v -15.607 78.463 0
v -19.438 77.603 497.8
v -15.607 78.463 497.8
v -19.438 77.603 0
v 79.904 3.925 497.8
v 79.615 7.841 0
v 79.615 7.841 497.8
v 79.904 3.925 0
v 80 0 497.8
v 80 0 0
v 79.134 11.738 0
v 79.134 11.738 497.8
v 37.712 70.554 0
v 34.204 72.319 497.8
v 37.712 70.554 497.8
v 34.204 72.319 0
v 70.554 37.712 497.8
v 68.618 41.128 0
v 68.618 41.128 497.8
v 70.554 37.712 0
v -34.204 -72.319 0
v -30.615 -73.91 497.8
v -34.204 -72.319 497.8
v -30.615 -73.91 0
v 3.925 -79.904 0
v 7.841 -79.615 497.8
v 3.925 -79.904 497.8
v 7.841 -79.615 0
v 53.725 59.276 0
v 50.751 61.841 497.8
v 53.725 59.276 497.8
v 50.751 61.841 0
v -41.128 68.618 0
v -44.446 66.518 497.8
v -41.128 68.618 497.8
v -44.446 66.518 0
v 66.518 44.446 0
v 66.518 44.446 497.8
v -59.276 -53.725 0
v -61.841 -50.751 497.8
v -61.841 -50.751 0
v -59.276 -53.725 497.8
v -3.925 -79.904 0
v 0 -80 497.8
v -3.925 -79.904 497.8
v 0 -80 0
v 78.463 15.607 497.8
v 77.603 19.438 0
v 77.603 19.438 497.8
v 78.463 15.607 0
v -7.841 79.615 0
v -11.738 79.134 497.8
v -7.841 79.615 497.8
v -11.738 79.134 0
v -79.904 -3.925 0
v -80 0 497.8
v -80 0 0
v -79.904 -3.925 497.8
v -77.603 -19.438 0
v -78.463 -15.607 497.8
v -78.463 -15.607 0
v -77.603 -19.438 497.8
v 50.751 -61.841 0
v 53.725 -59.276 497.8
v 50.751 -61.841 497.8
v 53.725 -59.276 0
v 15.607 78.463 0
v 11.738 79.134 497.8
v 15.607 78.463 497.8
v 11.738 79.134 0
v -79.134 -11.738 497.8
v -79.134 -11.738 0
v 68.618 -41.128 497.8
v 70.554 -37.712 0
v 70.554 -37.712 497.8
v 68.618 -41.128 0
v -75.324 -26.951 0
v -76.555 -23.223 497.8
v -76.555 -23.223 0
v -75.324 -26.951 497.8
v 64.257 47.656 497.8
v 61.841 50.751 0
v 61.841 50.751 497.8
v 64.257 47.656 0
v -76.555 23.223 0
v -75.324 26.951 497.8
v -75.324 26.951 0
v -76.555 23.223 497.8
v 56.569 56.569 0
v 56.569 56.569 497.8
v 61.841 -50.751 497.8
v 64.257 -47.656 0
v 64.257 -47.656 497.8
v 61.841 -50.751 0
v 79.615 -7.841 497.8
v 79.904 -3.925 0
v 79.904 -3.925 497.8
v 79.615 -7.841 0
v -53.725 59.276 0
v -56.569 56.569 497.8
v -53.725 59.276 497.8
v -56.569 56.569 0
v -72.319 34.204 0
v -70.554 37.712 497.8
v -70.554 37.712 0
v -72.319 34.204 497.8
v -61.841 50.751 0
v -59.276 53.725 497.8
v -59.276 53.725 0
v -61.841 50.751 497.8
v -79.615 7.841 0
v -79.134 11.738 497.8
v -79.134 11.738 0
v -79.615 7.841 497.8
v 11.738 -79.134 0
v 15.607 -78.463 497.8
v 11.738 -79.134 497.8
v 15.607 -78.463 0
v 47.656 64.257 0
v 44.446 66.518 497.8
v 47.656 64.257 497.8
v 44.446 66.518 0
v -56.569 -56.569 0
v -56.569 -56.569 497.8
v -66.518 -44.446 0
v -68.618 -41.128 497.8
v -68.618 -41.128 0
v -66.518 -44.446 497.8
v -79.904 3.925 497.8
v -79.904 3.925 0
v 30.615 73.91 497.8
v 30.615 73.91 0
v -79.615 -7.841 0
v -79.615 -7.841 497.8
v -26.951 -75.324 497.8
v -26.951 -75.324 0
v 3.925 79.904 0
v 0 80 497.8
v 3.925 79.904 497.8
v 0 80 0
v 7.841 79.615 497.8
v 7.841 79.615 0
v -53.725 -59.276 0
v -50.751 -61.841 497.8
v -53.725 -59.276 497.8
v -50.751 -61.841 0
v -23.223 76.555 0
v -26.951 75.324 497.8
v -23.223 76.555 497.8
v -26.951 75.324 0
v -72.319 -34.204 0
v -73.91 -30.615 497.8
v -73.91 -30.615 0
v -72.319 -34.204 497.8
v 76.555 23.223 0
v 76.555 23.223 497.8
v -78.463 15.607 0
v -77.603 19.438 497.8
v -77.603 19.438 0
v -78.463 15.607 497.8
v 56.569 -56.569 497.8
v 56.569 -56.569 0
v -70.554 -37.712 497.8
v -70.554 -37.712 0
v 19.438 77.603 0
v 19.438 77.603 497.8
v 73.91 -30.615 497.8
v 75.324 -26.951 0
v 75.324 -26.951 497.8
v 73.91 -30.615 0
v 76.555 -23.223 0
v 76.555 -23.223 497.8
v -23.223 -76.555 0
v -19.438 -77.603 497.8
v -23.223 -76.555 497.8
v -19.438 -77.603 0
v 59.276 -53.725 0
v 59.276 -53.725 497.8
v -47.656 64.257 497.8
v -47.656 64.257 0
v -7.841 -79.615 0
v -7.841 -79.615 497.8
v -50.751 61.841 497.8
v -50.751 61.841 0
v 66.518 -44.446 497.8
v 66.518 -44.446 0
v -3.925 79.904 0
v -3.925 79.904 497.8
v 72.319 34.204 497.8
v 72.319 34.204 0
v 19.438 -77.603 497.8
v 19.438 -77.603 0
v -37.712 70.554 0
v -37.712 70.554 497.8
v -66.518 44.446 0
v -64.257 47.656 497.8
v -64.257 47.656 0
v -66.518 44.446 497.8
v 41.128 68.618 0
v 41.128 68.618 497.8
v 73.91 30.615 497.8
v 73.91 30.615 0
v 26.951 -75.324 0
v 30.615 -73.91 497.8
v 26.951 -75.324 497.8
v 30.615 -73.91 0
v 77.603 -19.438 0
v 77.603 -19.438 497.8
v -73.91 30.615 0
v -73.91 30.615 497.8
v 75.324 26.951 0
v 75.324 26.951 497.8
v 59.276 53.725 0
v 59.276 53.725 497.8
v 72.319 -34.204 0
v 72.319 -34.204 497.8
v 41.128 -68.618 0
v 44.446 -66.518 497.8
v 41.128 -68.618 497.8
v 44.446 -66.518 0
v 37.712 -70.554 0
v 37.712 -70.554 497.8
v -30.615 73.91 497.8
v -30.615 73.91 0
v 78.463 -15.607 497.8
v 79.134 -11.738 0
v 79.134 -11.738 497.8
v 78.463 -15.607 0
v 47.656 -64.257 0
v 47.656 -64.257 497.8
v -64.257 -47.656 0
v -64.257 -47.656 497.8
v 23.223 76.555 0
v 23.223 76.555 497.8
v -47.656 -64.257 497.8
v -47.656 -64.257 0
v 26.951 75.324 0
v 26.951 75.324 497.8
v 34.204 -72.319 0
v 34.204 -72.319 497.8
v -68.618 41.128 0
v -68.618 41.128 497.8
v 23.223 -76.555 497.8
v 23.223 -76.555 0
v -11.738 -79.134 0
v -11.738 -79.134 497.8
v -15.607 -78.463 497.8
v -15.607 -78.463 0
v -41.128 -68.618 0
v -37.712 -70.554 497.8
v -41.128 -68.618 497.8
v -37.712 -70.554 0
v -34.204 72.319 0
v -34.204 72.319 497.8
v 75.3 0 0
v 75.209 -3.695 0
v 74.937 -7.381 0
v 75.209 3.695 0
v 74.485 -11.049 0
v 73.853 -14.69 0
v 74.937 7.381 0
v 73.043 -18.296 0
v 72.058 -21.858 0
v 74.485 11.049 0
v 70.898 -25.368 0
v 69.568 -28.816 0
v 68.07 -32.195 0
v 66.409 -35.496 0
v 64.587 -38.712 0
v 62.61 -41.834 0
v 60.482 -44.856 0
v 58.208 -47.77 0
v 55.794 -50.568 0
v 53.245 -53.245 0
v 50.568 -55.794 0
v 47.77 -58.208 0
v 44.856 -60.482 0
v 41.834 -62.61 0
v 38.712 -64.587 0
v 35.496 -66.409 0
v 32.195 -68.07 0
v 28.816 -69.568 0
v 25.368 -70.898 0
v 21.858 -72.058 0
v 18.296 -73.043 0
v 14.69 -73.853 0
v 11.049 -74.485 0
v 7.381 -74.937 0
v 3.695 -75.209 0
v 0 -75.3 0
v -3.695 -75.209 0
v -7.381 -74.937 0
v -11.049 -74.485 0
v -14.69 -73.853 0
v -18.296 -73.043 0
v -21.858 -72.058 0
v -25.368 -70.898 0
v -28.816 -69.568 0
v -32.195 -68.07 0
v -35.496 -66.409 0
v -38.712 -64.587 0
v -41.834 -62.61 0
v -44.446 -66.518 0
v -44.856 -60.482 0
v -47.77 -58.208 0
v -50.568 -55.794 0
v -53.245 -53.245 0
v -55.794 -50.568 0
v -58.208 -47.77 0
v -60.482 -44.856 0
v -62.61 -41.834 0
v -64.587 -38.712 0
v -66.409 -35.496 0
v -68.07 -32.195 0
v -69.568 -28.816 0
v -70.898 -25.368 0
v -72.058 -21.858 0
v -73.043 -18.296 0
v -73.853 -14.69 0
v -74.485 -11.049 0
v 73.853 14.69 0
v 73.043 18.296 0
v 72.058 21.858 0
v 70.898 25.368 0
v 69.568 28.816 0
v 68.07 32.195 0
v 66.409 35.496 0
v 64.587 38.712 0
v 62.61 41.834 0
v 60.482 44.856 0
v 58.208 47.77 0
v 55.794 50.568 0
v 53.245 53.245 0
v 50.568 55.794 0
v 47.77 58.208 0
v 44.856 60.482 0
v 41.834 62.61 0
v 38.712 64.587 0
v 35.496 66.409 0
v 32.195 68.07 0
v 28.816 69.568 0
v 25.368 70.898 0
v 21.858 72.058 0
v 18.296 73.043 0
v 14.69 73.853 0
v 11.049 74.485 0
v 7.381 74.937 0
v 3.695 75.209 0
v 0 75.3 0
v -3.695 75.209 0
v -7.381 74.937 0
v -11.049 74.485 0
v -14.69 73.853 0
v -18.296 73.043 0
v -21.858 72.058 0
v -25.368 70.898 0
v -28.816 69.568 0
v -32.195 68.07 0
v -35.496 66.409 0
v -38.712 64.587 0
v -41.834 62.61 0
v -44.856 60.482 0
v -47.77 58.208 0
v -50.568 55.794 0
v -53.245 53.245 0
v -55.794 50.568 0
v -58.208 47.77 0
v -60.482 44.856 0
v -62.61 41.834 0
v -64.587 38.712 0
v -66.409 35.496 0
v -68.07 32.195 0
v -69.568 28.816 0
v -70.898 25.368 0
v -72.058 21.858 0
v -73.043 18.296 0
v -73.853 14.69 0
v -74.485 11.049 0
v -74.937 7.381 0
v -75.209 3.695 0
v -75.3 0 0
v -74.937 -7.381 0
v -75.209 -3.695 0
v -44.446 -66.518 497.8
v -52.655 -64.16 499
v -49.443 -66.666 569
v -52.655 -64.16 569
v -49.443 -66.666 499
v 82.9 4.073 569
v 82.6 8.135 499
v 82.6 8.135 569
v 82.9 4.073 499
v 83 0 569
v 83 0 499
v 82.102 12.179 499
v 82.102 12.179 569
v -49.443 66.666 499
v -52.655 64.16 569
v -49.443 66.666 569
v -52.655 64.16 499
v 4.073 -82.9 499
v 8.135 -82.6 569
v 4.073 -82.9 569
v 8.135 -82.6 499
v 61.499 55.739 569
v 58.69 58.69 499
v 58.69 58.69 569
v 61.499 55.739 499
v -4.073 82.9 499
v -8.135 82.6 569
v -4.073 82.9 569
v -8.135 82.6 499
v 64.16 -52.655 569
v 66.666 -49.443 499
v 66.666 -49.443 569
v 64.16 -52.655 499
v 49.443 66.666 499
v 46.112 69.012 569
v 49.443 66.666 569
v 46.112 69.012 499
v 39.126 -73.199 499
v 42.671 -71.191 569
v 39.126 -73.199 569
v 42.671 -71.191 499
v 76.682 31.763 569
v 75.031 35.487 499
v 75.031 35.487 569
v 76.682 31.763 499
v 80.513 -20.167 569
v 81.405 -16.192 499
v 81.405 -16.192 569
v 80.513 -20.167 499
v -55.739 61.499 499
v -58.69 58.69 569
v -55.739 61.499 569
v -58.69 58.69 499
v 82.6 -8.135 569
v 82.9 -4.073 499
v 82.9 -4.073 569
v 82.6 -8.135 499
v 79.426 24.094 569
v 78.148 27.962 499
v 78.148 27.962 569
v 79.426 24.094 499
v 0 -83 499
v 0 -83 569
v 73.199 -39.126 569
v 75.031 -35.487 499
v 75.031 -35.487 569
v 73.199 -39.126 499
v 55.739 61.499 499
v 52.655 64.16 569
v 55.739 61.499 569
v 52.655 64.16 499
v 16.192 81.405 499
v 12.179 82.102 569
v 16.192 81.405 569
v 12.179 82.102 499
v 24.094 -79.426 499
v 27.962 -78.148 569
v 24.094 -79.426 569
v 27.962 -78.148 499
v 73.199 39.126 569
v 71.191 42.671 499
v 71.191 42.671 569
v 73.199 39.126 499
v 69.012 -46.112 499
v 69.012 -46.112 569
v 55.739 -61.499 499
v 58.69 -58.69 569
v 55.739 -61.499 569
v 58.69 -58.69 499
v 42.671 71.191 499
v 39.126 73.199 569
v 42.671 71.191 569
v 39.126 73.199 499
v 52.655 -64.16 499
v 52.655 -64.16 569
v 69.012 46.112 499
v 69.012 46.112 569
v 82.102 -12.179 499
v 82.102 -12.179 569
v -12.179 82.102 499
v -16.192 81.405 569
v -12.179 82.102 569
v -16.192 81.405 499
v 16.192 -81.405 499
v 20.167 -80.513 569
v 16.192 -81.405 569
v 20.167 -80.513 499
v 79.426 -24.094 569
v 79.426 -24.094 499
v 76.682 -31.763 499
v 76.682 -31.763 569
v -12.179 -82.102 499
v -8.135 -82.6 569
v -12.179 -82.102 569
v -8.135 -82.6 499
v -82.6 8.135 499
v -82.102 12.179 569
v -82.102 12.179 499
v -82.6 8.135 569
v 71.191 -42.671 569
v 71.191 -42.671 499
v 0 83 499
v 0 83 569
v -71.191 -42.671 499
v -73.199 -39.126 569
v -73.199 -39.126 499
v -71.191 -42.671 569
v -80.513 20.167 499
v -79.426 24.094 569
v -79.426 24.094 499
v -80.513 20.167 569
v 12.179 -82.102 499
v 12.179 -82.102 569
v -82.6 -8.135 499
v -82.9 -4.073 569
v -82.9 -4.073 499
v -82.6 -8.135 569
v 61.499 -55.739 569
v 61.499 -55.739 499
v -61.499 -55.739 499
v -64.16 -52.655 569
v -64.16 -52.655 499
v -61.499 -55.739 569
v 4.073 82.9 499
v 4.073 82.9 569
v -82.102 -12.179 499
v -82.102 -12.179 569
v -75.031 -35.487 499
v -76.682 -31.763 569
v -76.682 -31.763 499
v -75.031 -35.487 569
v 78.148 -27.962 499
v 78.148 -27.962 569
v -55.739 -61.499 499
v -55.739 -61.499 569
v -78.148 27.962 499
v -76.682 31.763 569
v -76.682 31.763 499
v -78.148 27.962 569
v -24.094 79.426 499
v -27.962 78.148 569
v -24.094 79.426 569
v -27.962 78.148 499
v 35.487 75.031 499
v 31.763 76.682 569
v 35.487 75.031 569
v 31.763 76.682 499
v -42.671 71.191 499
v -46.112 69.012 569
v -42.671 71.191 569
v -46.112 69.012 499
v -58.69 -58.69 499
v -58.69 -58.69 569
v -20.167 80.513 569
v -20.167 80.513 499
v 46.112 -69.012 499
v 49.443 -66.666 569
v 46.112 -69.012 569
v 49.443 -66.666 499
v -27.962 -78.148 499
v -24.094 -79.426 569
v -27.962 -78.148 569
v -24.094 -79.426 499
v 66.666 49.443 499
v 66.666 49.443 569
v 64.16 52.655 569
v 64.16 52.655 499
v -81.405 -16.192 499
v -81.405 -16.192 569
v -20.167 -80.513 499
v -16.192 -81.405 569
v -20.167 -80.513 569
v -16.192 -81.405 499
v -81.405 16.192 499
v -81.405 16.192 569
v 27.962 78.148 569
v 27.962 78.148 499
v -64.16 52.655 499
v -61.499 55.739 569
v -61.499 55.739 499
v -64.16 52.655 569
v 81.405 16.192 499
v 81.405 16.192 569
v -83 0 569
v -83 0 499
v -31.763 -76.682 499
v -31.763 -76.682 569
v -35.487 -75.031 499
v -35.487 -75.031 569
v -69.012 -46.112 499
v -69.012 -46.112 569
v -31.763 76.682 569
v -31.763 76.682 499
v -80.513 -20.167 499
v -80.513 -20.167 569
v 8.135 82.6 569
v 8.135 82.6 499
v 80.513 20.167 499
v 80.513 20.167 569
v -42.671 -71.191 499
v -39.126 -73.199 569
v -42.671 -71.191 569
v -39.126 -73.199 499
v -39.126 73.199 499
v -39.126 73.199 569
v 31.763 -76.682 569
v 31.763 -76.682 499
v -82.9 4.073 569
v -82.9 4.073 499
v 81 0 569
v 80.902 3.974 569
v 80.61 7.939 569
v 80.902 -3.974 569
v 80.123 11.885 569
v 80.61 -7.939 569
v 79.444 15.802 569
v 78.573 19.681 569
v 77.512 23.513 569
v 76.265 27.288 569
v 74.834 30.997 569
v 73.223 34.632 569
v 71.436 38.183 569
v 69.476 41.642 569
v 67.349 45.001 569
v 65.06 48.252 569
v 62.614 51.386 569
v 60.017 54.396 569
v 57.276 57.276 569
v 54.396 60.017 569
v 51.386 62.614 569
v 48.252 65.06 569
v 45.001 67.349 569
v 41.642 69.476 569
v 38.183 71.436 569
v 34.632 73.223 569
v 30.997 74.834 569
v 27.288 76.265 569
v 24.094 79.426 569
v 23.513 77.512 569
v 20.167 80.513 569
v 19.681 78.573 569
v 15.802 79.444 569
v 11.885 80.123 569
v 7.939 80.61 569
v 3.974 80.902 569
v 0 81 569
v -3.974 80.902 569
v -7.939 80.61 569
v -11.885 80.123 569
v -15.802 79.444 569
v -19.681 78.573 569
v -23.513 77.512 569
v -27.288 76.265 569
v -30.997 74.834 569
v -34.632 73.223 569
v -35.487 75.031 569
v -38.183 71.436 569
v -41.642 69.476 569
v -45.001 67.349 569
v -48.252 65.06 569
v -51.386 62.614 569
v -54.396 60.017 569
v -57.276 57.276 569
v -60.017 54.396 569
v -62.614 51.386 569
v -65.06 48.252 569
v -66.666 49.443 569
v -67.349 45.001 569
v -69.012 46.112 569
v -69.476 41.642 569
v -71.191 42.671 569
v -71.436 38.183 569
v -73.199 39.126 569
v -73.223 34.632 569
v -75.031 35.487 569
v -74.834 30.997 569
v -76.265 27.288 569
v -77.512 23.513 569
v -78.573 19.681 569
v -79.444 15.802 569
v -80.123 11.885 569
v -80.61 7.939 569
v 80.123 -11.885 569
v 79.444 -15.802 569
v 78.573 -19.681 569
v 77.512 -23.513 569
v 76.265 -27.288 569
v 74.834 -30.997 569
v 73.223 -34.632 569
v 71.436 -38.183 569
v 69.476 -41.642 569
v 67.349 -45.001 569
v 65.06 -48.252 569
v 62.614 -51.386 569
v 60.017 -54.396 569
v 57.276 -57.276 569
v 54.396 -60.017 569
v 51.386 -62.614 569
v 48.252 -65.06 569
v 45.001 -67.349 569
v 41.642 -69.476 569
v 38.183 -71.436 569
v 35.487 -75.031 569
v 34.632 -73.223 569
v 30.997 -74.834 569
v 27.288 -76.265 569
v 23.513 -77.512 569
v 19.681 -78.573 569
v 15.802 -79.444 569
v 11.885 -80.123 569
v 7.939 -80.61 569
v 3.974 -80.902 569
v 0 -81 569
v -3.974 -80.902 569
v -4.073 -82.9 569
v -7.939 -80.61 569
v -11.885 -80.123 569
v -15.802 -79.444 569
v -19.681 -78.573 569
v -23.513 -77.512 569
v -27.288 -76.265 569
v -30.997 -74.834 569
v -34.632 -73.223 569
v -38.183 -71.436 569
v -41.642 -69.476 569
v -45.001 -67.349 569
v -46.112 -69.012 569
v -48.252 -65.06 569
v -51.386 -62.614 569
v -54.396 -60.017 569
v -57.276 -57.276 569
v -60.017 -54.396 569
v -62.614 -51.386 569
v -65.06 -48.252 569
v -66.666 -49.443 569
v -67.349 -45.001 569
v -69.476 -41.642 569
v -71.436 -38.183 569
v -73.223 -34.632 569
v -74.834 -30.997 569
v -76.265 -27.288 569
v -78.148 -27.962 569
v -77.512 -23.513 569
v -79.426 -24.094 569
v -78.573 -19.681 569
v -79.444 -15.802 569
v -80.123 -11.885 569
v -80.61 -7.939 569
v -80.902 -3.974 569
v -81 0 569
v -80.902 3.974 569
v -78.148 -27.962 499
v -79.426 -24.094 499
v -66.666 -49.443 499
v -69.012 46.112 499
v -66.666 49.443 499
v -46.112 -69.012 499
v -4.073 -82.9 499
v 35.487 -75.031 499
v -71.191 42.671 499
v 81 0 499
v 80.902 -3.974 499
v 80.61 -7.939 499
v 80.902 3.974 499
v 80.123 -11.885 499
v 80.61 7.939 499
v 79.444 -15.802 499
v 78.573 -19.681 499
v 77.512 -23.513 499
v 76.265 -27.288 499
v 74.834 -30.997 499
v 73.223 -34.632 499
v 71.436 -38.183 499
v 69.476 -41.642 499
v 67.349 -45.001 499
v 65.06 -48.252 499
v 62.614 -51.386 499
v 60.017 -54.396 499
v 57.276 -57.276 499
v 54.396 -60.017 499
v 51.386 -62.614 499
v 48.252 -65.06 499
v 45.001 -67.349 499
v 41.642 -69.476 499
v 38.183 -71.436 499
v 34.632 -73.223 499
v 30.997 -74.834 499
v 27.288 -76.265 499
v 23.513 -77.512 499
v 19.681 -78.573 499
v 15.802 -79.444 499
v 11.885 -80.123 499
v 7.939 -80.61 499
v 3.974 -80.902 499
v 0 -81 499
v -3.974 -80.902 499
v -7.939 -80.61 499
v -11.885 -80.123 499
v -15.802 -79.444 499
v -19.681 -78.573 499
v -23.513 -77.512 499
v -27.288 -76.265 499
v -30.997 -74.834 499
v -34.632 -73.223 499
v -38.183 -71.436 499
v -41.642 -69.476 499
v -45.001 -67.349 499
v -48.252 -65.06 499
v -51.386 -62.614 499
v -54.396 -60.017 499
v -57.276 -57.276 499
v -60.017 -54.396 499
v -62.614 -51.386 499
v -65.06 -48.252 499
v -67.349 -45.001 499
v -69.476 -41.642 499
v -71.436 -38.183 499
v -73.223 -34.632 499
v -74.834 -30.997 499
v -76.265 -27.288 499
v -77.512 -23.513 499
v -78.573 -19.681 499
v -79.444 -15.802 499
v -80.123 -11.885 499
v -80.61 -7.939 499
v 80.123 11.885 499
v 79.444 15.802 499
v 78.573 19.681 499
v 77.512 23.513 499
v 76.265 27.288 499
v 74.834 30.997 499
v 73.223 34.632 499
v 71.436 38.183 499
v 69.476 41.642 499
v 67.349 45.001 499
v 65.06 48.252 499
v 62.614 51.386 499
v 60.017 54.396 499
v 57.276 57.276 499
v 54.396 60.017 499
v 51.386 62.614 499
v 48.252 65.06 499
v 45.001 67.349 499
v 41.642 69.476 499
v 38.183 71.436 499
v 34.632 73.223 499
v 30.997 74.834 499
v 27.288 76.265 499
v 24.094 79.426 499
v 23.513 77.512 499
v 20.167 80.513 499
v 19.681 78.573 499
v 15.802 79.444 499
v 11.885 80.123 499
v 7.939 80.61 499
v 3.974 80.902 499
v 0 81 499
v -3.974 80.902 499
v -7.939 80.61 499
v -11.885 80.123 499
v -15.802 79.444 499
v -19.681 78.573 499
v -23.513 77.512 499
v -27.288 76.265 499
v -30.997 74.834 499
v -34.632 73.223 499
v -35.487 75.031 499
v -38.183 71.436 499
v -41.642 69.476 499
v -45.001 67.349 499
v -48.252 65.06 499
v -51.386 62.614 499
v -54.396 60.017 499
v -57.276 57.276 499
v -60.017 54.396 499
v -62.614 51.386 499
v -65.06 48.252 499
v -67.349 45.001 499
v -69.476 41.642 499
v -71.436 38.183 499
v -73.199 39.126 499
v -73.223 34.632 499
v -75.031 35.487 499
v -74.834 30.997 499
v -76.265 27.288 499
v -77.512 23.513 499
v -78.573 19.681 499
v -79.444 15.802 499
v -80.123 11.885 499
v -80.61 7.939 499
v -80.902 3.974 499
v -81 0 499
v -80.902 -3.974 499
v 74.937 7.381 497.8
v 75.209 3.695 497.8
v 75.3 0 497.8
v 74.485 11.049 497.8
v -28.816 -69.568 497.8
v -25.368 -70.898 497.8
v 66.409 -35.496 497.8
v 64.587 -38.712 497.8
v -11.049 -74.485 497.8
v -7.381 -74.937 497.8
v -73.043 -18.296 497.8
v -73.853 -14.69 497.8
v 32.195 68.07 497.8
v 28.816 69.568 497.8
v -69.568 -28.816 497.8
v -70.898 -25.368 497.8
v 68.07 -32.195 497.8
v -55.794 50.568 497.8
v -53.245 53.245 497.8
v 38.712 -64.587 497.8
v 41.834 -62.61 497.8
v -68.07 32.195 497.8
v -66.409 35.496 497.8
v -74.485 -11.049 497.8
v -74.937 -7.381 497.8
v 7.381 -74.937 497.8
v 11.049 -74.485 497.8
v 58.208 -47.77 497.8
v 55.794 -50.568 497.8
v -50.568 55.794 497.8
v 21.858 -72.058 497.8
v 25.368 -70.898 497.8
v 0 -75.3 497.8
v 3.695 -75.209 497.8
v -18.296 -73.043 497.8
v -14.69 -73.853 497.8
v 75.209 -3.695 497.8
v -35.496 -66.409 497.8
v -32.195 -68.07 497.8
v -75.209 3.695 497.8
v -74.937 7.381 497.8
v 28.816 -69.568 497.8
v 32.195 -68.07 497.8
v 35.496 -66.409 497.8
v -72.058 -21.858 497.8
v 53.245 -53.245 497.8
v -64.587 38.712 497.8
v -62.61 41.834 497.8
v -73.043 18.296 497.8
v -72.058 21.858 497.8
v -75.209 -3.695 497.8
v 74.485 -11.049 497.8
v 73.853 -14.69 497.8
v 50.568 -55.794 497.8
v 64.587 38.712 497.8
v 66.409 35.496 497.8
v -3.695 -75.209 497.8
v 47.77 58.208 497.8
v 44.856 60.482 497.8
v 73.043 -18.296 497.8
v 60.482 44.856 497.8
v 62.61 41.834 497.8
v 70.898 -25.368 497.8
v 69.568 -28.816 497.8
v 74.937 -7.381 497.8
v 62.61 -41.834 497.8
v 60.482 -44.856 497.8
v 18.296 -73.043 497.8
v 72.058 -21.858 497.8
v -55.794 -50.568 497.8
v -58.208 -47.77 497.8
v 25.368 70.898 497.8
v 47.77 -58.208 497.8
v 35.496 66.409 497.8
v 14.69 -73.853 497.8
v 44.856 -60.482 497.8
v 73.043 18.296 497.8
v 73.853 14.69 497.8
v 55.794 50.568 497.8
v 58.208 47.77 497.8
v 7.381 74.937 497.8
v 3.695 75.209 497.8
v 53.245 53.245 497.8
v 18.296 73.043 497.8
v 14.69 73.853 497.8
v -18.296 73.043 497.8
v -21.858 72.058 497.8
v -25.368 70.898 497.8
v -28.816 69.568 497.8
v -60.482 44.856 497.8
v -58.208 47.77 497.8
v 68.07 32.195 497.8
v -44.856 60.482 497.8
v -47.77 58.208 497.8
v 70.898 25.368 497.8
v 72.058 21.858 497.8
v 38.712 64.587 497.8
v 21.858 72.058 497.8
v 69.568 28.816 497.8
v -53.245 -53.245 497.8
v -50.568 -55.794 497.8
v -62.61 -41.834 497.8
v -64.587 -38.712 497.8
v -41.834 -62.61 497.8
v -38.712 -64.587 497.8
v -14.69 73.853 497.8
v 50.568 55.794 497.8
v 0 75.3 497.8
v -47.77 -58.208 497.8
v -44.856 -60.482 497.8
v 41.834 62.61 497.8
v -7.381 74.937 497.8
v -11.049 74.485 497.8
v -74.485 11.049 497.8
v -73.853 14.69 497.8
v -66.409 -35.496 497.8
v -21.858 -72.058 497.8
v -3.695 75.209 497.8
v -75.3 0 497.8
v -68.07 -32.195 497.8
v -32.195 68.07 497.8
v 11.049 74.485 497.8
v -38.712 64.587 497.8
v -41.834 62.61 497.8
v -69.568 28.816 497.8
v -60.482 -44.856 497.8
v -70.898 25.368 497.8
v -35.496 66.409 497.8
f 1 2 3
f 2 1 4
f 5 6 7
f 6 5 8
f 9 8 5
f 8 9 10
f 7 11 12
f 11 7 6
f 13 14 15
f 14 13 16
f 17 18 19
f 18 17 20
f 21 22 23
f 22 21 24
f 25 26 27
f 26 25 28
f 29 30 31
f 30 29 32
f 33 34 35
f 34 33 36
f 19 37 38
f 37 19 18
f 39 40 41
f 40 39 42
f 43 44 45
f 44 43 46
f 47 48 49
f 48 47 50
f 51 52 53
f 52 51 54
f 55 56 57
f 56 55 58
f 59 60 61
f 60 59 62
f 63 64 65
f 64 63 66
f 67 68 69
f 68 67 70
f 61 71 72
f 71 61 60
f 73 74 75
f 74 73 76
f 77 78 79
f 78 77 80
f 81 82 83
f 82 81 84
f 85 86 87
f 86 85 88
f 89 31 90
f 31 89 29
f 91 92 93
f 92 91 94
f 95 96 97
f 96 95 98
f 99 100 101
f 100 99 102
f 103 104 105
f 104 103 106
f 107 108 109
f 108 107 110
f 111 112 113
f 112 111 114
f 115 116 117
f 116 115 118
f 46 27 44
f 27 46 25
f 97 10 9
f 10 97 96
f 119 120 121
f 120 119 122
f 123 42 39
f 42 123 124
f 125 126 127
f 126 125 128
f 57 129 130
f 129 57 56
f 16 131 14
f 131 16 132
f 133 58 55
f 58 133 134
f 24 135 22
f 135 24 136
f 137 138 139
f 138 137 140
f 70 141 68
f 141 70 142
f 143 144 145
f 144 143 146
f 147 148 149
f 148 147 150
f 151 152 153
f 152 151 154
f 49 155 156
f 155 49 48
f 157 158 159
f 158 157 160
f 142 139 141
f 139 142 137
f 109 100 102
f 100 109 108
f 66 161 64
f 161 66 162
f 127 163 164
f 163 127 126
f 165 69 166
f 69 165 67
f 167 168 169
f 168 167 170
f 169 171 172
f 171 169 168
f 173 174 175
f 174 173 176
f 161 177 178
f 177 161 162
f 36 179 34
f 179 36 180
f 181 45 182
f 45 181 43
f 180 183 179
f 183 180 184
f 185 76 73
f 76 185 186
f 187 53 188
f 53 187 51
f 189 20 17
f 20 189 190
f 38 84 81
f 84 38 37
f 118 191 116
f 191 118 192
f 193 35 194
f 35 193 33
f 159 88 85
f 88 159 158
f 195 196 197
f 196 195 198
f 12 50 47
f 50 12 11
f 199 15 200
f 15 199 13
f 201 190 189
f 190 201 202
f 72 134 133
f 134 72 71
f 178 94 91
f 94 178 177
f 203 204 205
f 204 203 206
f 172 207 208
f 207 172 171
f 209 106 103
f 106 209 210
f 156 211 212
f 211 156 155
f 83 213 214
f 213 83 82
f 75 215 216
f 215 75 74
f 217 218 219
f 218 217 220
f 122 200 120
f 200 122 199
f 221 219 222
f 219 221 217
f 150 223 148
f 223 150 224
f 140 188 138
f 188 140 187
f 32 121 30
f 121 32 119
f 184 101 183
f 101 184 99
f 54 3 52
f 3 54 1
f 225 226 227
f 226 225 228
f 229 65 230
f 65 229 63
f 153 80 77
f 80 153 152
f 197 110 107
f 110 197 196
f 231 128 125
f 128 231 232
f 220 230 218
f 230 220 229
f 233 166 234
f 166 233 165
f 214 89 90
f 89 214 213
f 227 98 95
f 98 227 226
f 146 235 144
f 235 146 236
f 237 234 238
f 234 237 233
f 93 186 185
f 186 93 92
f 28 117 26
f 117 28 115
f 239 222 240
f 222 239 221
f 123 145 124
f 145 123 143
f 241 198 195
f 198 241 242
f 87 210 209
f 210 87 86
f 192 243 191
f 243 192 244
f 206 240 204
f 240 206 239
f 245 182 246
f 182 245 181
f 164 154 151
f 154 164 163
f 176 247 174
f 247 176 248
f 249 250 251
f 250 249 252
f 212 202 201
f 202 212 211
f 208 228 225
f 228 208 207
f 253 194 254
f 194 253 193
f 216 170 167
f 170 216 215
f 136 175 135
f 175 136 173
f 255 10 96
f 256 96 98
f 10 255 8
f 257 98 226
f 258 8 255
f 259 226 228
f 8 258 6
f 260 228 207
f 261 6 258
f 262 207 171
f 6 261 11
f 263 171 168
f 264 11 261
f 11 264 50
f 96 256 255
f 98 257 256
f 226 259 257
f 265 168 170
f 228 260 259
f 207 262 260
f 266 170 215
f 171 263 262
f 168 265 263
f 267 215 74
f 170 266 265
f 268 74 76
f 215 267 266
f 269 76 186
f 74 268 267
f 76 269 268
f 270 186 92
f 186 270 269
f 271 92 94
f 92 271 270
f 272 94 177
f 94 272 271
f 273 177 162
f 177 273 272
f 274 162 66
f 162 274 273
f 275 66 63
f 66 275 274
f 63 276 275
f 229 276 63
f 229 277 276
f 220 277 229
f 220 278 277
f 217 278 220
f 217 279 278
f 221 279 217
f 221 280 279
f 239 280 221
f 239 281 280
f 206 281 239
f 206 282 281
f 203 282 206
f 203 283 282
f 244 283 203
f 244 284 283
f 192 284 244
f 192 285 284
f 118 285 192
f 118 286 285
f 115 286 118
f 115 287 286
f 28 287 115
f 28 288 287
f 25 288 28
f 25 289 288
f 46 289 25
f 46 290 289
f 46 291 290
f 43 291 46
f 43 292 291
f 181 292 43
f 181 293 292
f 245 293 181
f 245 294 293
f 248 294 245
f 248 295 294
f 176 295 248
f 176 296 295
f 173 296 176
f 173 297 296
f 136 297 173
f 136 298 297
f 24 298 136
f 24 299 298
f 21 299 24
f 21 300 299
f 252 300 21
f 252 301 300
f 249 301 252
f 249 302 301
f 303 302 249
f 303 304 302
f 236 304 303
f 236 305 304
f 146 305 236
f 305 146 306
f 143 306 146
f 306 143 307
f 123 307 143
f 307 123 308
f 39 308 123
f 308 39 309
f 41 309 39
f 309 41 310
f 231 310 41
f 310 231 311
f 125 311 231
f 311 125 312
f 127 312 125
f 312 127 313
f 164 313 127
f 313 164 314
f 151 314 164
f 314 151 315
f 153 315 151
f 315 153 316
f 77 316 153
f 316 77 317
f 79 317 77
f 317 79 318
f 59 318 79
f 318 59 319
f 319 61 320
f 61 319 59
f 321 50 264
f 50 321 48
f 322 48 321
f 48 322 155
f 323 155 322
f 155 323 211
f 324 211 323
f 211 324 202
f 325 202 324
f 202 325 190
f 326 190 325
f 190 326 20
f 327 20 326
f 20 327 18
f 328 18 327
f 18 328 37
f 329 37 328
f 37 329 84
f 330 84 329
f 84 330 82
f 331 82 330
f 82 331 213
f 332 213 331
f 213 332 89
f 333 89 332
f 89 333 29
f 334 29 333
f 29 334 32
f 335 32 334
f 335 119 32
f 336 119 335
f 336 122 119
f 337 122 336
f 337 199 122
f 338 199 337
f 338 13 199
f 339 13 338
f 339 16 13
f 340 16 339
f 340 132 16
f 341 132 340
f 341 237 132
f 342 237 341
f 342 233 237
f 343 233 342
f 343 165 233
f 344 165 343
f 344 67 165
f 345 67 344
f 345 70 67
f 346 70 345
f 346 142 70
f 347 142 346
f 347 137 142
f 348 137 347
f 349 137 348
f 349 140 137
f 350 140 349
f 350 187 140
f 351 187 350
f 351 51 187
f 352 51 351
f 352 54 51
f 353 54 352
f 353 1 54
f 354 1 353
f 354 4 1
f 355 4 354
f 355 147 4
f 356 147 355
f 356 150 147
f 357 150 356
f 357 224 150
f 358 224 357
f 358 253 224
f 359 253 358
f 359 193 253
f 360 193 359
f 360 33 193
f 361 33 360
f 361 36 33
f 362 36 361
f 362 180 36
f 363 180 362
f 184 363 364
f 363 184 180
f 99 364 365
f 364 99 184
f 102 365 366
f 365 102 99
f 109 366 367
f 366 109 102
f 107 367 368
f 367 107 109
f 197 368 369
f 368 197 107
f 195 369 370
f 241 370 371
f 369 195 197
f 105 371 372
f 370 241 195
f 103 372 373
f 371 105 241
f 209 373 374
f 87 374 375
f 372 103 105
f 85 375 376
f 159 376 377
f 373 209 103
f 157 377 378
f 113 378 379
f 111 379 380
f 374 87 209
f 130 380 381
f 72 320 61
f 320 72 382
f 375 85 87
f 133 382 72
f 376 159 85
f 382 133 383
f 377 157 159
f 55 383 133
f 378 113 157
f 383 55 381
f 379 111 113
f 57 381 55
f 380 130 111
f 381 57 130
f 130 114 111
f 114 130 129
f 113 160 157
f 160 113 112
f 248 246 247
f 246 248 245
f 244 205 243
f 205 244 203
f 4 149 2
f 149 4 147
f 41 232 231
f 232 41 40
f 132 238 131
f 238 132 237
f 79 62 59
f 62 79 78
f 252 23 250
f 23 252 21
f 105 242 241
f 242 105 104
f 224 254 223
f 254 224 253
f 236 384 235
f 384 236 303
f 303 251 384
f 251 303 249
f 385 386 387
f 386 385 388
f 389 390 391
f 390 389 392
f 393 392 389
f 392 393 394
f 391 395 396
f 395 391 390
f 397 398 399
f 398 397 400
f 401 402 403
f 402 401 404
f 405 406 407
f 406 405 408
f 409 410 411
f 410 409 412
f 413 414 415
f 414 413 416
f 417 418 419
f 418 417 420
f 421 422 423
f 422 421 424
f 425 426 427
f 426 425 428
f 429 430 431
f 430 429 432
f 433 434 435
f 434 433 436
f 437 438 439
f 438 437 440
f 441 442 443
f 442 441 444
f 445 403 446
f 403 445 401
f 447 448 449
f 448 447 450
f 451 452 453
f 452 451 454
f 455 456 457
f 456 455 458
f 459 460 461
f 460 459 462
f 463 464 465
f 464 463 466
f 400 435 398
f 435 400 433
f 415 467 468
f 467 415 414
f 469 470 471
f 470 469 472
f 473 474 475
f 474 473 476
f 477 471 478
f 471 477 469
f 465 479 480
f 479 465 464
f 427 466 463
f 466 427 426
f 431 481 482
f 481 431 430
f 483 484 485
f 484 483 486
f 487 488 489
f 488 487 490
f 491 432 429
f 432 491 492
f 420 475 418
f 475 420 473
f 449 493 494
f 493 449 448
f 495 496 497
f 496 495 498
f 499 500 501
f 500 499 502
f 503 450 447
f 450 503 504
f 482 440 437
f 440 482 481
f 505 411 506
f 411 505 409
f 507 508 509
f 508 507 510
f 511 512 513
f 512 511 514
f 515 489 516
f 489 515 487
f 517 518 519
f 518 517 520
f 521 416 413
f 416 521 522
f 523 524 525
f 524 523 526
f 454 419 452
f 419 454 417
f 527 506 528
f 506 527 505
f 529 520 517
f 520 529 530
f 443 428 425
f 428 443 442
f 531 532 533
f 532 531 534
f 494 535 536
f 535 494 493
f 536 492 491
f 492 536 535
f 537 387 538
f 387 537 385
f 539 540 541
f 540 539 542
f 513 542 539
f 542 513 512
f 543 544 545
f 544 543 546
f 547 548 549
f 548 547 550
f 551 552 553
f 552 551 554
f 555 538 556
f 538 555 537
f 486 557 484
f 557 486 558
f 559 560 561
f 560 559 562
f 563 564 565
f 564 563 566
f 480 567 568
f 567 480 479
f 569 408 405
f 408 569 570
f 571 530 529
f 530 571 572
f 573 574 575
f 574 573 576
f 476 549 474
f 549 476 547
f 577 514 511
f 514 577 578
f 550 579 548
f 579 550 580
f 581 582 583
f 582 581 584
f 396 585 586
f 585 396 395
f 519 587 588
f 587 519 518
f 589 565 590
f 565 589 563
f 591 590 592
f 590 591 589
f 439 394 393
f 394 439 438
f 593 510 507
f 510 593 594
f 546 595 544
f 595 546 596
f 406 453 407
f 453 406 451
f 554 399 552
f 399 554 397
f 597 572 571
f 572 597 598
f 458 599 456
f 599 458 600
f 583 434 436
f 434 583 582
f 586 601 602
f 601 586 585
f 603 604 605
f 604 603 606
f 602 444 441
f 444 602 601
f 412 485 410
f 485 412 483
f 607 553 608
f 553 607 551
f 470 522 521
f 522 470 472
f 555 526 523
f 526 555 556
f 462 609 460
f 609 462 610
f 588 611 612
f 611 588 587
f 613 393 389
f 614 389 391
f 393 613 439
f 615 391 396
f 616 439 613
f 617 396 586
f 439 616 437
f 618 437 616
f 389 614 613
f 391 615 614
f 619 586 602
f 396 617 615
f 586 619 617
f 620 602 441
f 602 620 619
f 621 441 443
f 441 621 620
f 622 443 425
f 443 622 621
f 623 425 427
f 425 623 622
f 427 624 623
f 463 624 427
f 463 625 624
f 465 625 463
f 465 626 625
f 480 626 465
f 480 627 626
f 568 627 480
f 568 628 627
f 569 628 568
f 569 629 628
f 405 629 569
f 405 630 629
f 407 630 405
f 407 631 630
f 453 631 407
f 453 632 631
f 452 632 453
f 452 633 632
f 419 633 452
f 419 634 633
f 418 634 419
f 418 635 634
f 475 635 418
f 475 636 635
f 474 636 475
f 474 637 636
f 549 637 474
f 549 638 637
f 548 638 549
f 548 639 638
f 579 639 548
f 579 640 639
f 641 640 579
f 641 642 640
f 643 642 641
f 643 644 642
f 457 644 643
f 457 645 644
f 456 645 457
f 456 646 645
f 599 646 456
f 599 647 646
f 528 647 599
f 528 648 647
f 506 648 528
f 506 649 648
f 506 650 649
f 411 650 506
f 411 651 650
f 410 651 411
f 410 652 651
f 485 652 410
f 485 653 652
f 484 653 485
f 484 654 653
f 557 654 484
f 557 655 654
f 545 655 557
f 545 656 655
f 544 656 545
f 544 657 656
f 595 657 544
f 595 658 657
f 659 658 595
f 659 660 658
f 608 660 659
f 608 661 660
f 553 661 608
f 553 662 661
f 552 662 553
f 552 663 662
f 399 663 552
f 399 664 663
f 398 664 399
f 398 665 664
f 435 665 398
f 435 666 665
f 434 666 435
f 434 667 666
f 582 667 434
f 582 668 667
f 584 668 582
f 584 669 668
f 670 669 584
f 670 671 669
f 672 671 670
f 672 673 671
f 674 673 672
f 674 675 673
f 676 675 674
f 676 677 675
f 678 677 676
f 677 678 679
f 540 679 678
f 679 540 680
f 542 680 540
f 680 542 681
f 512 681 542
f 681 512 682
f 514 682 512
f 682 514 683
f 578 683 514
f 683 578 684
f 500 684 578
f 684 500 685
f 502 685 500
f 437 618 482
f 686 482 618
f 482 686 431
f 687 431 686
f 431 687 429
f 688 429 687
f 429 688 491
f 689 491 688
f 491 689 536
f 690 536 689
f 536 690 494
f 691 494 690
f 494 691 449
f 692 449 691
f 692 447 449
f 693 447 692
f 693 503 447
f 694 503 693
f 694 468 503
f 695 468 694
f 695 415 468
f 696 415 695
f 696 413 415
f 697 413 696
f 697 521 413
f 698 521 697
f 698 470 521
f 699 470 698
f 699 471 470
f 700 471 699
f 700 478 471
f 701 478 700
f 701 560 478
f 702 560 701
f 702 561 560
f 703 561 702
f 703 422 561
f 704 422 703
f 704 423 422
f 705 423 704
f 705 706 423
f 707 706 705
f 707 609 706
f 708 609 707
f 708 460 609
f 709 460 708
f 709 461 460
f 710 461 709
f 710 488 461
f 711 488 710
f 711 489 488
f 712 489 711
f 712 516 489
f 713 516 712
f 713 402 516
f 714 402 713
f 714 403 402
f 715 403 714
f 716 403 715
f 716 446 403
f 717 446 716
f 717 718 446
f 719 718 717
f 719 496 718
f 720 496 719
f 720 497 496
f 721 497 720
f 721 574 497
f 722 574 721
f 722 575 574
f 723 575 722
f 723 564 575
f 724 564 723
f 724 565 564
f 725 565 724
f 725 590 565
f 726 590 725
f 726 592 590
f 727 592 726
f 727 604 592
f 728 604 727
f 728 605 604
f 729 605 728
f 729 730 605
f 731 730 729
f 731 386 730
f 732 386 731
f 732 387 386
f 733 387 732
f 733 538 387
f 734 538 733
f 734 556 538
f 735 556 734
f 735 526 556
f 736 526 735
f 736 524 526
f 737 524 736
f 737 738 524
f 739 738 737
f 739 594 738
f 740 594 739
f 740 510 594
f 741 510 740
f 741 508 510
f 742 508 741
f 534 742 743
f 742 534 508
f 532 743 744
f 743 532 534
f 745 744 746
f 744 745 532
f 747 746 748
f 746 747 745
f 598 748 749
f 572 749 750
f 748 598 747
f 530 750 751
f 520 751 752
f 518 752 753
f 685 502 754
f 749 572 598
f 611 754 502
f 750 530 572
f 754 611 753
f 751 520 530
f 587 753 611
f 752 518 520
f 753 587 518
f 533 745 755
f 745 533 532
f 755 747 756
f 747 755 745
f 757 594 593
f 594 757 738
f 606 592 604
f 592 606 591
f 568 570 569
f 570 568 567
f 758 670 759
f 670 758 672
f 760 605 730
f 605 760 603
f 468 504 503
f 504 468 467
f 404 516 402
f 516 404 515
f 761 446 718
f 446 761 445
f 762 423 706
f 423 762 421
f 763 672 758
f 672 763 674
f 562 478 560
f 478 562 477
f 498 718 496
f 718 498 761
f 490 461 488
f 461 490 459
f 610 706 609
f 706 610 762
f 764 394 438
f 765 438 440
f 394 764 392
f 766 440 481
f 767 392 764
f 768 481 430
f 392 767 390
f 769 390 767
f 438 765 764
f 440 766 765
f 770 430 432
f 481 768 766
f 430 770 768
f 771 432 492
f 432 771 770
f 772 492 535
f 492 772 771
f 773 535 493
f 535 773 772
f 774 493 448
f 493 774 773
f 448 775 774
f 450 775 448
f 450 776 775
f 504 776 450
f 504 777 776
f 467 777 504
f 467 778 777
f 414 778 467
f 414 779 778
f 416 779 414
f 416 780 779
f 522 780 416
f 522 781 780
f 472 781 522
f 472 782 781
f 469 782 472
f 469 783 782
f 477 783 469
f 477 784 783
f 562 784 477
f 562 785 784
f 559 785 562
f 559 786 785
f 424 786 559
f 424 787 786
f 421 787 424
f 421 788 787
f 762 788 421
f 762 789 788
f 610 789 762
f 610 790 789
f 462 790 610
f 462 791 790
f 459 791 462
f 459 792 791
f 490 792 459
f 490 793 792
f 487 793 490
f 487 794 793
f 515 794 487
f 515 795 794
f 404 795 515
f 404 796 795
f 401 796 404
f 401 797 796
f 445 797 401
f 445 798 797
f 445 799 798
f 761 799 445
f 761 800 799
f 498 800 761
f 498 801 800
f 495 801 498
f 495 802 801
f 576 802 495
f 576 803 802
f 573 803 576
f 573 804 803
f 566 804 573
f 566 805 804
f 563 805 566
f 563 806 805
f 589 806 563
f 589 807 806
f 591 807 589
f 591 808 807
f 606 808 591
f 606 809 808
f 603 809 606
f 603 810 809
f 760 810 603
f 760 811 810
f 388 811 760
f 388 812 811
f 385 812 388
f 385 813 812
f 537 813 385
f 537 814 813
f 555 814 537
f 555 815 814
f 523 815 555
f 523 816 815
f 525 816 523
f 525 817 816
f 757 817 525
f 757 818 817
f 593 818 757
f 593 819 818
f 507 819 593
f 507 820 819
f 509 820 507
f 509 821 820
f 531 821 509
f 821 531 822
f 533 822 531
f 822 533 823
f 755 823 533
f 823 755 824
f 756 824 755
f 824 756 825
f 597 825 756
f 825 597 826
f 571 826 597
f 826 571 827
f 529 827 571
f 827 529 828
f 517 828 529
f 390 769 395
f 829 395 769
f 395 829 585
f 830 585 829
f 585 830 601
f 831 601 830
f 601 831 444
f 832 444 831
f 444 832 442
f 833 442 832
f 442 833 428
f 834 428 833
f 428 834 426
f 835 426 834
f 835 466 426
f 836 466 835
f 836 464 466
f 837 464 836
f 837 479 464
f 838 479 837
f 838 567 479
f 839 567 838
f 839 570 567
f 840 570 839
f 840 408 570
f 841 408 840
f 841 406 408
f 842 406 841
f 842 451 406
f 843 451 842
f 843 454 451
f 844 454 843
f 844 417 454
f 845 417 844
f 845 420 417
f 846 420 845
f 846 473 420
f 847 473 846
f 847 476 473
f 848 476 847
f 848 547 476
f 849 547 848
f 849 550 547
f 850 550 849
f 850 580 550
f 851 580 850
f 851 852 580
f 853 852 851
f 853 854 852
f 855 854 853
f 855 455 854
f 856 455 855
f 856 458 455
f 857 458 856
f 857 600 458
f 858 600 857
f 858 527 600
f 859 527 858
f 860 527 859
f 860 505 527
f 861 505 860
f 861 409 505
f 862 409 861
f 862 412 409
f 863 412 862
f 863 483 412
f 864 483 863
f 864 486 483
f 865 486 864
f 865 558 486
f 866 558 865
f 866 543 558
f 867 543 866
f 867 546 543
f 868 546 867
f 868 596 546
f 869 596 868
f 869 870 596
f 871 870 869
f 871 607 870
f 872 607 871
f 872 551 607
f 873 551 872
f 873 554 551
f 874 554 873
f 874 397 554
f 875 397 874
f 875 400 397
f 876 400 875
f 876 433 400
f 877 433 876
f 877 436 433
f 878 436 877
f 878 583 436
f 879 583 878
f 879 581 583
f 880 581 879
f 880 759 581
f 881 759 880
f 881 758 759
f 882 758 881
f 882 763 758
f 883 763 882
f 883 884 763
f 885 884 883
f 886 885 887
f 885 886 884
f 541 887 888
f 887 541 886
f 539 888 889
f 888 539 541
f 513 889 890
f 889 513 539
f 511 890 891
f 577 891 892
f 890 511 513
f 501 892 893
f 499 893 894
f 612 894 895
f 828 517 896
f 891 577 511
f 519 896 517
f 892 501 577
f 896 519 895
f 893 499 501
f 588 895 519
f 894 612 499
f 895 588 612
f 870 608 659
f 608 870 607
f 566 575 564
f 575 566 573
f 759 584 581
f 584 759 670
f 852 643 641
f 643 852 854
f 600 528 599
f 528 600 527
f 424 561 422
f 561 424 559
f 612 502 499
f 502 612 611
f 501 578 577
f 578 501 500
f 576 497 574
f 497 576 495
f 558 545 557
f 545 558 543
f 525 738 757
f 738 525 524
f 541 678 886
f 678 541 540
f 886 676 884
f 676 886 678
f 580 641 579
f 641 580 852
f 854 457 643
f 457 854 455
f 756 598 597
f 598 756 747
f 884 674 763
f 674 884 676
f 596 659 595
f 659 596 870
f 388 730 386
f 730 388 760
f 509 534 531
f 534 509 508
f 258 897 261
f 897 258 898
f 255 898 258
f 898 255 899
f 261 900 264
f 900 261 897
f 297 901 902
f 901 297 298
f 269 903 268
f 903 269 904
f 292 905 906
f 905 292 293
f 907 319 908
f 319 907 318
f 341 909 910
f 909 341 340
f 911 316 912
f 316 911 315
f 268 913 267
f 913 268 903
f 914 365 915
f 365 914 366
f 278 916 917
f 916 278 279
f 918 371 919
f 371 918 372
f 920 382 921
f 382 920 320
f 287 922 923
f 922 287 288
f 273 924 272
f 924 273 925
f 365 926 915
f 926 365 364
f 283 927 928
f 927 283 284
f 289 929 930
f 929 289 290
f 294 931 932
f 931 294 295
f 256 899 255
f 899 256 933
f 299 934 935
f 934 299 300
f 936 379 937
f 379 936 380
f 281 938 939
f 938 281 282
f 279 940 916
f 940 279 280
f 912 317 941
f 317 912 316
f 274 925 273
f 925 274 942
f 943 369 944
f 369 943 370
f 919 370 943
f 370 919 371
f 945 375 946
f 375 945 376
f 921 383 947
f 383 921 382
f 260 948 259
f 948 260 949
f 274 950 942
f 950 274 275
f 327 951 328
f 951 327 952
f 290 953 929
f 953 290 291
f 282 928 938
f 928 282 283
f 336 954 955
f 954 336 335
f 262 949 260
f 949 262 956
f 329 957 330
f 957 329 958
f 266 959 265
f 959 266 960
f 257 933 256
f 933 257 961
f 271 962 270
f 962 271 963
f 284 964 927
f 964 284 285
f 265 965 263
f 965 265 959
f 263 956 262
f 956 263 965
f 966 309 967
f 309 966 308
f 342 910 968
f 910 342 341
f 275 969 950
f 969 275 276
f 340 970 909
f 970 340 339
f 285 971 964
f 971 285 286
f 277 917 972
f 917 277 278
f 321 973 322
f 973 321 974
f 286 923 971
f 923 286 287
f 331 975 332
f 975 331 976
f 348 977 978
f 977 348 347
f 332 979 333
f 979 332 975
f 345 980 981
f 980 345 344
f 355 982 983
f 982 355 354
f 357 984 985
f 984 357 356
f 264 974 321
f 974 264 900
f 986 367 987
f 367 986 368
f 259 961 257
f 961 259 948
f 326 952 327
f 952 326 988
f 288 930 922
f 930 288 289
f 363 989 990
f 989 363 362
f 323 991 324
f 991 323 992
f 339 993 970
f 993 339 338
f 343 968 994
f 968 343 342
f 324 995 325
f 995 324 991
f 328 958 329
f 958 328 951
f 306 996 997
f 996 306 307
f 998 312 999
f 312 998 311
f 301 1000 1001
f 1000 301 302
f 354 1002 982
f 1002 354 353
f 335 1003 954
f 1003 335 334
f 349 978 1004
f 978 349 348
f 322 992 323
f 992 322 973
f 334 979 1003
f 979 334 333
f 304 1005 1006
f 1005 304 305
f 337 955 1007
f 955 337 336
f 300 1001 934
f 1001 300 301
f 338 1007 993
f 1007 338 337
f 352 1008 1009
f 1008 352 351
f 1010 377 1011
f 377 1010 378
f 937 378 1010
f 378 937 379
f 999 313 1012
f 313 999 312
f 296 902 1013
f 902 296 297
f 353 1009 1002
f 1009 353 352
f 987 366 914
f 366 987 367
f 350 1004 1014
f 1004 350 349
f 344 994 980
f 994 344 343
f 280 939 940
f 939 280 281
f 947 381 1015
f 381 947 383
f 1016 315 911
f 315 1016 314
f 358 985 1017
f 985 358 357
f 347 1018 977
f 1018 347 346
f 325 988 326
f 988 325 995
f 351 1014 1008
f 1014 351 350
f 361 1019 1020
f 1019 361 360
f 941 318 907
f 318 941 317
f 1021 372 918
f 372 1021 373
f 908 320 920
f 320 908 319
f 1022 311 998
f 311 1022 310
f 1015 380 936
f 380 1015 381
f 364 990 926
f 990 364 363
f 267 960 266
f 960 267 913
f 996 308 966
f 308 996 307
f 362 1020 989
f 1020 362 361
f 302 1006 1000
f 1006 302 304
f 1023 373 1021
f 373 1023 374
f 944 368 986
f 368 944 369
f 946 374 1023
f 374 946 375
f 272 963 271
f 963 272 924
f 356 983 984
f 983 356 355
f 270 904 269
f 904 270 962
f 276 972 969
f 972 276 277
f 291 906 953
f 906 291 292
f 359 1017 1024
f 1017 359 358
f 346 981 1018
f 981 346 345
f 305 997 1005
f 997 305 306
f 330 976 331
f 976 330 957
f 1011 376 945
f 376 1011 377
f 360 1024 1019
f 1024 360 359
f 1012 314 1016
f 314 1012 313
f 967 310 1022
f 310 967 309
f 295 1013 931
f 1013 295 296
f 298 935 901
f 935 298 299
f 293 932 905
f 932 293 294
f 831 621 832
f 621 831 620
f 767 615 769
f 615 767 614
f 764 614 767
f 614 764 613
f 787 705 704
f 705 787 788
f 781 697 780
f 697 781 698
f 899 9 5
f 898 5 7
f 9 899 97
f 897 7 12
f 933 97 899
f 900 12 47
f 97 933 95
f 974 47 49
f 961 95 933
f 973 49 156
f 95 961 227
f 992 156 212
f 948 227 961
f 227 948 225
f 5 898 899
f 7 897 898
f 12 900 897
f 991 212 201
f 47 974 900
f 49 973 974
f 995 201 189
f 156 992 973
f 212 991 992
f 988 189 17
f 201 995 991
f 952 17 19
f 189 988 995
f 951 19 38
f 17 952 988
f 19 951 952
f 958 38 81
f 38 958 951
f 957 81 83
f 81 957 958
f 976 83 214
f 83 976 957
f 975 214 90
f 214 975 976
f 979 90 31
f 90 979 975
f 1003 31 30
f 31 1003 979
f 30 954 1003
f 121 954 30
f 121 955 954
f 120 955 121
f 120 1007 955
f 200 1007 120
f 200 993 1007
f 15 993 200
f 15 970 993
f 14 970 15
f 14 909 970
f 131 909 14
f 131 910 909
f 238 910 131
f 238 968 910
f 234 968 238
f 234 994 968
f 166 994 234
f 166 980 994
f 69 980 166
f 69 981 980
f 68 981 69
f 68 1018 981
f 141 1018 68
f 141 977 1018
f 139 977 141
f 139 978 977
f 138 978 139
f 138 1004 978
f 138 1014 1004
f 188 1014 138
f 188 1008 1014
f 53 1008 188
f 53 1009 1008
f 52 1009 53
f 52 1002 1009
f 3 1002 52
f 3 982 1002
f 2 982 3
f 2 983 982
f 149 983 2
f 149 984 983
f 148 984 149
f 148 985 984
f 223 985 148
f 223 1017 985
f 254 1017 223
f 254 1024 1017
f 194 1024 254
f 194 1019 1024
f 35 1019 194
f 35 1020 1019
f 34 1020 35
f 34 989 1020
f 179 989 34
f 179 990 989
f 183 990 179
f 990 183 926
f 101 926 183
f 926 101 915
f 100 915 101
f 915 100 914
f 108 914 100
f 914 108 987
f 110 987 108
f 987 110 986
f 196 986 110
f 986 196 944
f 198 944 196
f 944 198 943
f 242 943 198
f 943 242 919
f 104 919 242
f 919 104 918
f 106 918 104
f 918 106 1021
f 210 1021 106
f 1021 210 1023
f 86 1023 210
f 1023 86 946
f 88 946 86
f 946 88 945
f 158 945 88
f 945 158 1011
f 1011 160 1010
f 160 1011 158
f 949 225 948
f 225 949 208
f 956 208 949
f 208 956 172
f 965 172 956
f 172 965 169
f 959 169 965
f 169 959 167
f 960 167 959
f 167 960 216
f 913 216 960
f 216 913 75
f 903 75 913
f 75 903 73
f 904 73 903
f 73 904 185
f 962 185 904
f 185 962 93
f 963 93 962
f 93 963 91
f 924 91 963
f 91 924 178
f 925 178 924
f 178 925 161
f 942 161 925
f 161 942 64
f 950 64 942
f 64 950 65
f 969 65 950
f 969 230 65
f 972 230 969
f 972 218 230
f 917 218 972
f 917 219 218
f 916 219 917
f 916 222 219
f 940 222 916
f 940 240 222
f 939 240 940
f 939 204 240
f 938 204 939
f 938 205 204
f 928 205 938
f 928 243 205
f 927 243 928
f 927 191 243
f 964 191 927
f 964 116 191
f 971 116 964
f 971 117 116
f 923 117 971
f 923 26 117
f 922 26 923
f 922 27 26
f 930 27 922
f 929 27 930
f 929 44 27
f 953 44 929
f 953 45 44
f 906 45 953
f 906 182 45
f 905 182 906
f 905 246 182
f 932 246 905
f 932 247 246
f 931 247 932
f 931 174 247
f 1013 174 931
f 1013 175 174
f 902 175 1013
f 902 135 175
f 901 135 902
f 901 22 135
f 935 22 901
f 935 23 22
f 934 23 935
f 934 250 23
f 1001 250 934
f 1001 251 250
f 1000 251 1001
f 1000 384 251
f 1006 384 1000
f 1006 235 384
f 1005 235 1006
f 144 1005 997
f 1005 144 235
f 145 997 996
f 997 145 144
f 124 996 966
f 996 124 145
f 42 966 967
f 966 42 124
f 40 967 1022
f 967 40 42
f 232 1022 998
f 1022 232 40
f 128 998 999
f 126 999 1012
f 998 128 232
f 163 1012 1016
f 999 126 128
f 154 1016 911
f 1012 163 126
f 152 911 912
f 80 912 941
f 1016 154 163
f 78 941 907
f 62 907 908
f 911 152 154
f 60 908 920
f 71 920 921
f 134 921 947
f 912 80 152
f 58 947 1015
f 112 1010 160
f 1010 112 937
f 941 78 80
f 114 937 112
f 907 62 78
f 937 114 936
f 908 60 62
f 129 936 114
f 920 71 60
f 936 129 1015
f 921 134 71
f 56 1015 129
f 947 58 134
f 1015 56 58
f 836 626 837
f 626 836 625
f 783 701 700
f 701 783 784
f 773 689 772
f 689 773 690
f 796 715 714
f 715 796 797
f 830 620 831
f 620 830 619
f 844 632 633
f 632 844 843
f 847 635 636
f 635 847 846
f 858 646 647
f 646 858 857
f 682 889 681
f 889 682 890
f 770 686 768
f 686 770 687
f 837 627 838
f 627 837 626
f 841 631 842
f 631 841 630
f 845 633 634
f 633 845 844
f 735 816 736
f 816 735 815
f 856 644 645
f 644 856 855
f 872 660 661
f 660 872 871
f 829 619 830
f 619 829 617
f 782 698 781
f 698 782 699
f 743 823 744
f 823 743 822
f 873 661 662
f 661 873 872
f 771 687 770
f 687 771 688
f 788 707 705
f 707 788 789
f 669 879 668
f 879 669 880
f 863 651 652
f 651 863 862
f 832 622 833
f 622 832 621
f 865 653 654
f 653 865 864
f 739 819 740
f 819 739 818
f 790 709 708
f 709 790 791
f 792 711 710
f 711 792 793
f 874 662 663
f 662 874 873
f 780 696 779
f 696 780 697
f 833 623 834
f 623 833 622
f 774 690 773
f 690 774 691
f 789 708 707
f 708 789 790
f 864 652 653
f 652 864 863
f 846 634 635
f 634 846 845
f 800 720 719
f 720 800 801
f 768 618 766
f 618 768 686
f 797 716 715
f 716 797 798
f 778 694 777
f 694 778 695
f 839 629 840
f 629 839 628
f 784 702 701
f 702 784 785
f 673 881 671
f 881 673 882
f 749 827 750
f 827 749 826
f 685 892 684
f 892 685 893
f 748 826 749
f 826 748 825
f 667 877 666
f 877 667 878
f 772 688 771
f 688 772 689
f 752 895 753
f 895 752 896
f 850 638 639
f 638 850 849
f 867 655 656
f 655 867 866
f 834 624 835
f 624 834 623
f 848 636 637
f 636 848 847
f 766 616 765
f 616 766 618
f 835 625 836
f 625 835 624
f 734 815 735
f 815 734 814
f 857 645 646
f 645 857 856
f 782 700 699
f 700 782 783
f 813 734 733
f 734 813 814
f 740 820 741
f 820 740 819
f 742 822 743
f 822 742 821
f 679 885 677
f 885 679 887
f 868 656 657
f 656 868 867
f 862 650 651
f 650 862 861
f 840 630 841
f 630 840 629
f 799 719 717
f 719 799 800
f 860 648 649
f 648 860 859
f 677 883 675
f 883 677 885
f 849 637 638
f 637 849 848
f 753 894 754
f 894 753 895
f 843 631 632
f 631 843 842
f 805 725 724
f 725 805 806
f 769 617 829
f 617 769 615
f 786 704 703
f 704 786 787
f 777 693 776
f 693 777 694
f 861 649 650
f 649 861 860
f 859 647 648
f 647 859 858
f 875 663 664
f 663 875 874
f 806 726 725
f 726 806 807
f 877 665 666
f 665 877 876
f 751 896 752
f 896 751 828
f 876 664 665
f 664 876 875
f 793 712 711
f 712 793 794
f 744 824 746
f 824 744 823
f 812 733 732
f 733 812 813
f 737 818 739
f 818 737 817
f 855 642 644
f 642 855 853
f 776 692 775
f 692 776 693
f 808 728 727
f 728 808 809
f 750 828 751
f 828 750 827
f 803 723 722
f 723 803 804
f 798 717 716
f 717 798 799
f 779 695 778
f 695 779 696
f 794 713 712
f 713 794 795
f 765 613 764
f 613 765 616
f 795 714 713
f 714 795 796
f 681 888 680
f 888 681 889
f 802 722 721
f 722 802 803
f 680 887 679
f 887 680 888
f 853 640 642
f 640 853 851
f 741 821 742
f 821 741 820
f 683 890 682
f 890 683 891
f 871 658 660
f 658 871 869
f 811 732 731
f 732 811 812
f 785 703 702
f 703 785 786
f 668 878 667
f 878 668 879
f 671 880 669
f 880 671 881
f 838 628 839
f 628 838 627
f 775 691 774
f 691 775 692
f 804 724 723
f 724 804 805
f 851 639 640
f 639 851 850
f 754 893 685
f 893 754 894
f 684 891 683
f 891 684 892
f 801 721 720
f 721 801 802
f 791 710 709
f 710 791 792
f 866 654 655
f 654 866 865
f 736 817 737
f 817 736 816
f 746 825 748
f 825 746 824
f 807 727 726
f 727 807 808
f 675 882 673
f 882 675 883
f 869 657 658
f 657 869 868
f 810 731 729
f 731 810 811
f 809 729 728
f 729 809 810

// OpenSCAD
// HT 160 pipe 500 mm (one connected solid)
nominal_diameter = 160; //[80:320:1]
length_mm = 500; //[250:1000:1]
ht160_outer_diameter = 160; //[120:200:1]
wall_thickness = 4.7; //[2.5:9.5:0.1]
socket_length = 70; //[40:120:1]
socket_wall_extra = 3.0; //[1.0:8.0:0.1]
socket_clearance = 1.0; //[0.2:2.5:0.1]
stop_ring_thickness = 3.0; //[1.0:8.0:0.1]
stop_ring_offset_from_end = 18; //[8:35:1]
stop_ring_radial_reduction = 2.0; //[0.5:5.0:0.1]
connection_overlap = 1.0; //[0.5:2.0:0.1]

$fn = 128;

module ht_pipe() {
    outer_r = ht160_outer_diameter/2;
    inner_r = max(0.01, outer_r - wall_thickness);

    socket_outer_r = outer_r + socket_wall_extra;
    socket_inner_r = outer_r + socket_clearance;

    body_h = length_mm;

    // Place body so its -Z end is at 0, +Z end at body_h
    body_zc = body_h/2;

    // Socket attached to +Z end of body with overlap
    socket_zc = body_h + socket_length/2 - connection_overlap;

    // Stop ring position measured from socket outer end (+Z end of socket)
    socket_end_z = body_h + socket_length - connection_overlap;
    ring_zc = socket_end_z - stop_ring_offset_from_end - stop_ring_thickness/2;

    // Ring creates an internal shoulder by reducing the inner void locally
    ring_void_r = max(0.01, socket_inner_r - stop_ring_radial_reduction);

    // Small epsilon to avoid coplanar faces
    eps = 0.2;

    color([0.85, 0.85, 0.8])
    difference() {
        // OUTER SOLID (connected)
        union() {
            translate([0, 0, body_zc])
                cylinder(h=body_h, r=outer_r, center=true);

            translate([0, 0, socket_zc])
                cylinder(h=socket_length, r=socket_outer_r, center=true);
        }

        // INNER VOIDS (connected)
        union() {
            // Main bore: extend slightly beyond ends
            translate([0, 0, body_zc])
                cylinder(h=body_h + 2*(connection_overlap + eps), r=inner_r, center=true);

            // Socket bore: extend slightly beyond ends
            translate([0, 0, socket_zc])
                cylinder(h=socket_length + 2*(connection_overlap + eps), r=socket_inner_r, center=true);

            // Stop ring: remove a smaller-bore section to leave a shoulder
            translate([0, 0, ring_zc])
                cylinder(h=stop_ring_thickness + 2*eps, r=ring_void_r, center=true);
        }
    }
}

ht_pipe();
